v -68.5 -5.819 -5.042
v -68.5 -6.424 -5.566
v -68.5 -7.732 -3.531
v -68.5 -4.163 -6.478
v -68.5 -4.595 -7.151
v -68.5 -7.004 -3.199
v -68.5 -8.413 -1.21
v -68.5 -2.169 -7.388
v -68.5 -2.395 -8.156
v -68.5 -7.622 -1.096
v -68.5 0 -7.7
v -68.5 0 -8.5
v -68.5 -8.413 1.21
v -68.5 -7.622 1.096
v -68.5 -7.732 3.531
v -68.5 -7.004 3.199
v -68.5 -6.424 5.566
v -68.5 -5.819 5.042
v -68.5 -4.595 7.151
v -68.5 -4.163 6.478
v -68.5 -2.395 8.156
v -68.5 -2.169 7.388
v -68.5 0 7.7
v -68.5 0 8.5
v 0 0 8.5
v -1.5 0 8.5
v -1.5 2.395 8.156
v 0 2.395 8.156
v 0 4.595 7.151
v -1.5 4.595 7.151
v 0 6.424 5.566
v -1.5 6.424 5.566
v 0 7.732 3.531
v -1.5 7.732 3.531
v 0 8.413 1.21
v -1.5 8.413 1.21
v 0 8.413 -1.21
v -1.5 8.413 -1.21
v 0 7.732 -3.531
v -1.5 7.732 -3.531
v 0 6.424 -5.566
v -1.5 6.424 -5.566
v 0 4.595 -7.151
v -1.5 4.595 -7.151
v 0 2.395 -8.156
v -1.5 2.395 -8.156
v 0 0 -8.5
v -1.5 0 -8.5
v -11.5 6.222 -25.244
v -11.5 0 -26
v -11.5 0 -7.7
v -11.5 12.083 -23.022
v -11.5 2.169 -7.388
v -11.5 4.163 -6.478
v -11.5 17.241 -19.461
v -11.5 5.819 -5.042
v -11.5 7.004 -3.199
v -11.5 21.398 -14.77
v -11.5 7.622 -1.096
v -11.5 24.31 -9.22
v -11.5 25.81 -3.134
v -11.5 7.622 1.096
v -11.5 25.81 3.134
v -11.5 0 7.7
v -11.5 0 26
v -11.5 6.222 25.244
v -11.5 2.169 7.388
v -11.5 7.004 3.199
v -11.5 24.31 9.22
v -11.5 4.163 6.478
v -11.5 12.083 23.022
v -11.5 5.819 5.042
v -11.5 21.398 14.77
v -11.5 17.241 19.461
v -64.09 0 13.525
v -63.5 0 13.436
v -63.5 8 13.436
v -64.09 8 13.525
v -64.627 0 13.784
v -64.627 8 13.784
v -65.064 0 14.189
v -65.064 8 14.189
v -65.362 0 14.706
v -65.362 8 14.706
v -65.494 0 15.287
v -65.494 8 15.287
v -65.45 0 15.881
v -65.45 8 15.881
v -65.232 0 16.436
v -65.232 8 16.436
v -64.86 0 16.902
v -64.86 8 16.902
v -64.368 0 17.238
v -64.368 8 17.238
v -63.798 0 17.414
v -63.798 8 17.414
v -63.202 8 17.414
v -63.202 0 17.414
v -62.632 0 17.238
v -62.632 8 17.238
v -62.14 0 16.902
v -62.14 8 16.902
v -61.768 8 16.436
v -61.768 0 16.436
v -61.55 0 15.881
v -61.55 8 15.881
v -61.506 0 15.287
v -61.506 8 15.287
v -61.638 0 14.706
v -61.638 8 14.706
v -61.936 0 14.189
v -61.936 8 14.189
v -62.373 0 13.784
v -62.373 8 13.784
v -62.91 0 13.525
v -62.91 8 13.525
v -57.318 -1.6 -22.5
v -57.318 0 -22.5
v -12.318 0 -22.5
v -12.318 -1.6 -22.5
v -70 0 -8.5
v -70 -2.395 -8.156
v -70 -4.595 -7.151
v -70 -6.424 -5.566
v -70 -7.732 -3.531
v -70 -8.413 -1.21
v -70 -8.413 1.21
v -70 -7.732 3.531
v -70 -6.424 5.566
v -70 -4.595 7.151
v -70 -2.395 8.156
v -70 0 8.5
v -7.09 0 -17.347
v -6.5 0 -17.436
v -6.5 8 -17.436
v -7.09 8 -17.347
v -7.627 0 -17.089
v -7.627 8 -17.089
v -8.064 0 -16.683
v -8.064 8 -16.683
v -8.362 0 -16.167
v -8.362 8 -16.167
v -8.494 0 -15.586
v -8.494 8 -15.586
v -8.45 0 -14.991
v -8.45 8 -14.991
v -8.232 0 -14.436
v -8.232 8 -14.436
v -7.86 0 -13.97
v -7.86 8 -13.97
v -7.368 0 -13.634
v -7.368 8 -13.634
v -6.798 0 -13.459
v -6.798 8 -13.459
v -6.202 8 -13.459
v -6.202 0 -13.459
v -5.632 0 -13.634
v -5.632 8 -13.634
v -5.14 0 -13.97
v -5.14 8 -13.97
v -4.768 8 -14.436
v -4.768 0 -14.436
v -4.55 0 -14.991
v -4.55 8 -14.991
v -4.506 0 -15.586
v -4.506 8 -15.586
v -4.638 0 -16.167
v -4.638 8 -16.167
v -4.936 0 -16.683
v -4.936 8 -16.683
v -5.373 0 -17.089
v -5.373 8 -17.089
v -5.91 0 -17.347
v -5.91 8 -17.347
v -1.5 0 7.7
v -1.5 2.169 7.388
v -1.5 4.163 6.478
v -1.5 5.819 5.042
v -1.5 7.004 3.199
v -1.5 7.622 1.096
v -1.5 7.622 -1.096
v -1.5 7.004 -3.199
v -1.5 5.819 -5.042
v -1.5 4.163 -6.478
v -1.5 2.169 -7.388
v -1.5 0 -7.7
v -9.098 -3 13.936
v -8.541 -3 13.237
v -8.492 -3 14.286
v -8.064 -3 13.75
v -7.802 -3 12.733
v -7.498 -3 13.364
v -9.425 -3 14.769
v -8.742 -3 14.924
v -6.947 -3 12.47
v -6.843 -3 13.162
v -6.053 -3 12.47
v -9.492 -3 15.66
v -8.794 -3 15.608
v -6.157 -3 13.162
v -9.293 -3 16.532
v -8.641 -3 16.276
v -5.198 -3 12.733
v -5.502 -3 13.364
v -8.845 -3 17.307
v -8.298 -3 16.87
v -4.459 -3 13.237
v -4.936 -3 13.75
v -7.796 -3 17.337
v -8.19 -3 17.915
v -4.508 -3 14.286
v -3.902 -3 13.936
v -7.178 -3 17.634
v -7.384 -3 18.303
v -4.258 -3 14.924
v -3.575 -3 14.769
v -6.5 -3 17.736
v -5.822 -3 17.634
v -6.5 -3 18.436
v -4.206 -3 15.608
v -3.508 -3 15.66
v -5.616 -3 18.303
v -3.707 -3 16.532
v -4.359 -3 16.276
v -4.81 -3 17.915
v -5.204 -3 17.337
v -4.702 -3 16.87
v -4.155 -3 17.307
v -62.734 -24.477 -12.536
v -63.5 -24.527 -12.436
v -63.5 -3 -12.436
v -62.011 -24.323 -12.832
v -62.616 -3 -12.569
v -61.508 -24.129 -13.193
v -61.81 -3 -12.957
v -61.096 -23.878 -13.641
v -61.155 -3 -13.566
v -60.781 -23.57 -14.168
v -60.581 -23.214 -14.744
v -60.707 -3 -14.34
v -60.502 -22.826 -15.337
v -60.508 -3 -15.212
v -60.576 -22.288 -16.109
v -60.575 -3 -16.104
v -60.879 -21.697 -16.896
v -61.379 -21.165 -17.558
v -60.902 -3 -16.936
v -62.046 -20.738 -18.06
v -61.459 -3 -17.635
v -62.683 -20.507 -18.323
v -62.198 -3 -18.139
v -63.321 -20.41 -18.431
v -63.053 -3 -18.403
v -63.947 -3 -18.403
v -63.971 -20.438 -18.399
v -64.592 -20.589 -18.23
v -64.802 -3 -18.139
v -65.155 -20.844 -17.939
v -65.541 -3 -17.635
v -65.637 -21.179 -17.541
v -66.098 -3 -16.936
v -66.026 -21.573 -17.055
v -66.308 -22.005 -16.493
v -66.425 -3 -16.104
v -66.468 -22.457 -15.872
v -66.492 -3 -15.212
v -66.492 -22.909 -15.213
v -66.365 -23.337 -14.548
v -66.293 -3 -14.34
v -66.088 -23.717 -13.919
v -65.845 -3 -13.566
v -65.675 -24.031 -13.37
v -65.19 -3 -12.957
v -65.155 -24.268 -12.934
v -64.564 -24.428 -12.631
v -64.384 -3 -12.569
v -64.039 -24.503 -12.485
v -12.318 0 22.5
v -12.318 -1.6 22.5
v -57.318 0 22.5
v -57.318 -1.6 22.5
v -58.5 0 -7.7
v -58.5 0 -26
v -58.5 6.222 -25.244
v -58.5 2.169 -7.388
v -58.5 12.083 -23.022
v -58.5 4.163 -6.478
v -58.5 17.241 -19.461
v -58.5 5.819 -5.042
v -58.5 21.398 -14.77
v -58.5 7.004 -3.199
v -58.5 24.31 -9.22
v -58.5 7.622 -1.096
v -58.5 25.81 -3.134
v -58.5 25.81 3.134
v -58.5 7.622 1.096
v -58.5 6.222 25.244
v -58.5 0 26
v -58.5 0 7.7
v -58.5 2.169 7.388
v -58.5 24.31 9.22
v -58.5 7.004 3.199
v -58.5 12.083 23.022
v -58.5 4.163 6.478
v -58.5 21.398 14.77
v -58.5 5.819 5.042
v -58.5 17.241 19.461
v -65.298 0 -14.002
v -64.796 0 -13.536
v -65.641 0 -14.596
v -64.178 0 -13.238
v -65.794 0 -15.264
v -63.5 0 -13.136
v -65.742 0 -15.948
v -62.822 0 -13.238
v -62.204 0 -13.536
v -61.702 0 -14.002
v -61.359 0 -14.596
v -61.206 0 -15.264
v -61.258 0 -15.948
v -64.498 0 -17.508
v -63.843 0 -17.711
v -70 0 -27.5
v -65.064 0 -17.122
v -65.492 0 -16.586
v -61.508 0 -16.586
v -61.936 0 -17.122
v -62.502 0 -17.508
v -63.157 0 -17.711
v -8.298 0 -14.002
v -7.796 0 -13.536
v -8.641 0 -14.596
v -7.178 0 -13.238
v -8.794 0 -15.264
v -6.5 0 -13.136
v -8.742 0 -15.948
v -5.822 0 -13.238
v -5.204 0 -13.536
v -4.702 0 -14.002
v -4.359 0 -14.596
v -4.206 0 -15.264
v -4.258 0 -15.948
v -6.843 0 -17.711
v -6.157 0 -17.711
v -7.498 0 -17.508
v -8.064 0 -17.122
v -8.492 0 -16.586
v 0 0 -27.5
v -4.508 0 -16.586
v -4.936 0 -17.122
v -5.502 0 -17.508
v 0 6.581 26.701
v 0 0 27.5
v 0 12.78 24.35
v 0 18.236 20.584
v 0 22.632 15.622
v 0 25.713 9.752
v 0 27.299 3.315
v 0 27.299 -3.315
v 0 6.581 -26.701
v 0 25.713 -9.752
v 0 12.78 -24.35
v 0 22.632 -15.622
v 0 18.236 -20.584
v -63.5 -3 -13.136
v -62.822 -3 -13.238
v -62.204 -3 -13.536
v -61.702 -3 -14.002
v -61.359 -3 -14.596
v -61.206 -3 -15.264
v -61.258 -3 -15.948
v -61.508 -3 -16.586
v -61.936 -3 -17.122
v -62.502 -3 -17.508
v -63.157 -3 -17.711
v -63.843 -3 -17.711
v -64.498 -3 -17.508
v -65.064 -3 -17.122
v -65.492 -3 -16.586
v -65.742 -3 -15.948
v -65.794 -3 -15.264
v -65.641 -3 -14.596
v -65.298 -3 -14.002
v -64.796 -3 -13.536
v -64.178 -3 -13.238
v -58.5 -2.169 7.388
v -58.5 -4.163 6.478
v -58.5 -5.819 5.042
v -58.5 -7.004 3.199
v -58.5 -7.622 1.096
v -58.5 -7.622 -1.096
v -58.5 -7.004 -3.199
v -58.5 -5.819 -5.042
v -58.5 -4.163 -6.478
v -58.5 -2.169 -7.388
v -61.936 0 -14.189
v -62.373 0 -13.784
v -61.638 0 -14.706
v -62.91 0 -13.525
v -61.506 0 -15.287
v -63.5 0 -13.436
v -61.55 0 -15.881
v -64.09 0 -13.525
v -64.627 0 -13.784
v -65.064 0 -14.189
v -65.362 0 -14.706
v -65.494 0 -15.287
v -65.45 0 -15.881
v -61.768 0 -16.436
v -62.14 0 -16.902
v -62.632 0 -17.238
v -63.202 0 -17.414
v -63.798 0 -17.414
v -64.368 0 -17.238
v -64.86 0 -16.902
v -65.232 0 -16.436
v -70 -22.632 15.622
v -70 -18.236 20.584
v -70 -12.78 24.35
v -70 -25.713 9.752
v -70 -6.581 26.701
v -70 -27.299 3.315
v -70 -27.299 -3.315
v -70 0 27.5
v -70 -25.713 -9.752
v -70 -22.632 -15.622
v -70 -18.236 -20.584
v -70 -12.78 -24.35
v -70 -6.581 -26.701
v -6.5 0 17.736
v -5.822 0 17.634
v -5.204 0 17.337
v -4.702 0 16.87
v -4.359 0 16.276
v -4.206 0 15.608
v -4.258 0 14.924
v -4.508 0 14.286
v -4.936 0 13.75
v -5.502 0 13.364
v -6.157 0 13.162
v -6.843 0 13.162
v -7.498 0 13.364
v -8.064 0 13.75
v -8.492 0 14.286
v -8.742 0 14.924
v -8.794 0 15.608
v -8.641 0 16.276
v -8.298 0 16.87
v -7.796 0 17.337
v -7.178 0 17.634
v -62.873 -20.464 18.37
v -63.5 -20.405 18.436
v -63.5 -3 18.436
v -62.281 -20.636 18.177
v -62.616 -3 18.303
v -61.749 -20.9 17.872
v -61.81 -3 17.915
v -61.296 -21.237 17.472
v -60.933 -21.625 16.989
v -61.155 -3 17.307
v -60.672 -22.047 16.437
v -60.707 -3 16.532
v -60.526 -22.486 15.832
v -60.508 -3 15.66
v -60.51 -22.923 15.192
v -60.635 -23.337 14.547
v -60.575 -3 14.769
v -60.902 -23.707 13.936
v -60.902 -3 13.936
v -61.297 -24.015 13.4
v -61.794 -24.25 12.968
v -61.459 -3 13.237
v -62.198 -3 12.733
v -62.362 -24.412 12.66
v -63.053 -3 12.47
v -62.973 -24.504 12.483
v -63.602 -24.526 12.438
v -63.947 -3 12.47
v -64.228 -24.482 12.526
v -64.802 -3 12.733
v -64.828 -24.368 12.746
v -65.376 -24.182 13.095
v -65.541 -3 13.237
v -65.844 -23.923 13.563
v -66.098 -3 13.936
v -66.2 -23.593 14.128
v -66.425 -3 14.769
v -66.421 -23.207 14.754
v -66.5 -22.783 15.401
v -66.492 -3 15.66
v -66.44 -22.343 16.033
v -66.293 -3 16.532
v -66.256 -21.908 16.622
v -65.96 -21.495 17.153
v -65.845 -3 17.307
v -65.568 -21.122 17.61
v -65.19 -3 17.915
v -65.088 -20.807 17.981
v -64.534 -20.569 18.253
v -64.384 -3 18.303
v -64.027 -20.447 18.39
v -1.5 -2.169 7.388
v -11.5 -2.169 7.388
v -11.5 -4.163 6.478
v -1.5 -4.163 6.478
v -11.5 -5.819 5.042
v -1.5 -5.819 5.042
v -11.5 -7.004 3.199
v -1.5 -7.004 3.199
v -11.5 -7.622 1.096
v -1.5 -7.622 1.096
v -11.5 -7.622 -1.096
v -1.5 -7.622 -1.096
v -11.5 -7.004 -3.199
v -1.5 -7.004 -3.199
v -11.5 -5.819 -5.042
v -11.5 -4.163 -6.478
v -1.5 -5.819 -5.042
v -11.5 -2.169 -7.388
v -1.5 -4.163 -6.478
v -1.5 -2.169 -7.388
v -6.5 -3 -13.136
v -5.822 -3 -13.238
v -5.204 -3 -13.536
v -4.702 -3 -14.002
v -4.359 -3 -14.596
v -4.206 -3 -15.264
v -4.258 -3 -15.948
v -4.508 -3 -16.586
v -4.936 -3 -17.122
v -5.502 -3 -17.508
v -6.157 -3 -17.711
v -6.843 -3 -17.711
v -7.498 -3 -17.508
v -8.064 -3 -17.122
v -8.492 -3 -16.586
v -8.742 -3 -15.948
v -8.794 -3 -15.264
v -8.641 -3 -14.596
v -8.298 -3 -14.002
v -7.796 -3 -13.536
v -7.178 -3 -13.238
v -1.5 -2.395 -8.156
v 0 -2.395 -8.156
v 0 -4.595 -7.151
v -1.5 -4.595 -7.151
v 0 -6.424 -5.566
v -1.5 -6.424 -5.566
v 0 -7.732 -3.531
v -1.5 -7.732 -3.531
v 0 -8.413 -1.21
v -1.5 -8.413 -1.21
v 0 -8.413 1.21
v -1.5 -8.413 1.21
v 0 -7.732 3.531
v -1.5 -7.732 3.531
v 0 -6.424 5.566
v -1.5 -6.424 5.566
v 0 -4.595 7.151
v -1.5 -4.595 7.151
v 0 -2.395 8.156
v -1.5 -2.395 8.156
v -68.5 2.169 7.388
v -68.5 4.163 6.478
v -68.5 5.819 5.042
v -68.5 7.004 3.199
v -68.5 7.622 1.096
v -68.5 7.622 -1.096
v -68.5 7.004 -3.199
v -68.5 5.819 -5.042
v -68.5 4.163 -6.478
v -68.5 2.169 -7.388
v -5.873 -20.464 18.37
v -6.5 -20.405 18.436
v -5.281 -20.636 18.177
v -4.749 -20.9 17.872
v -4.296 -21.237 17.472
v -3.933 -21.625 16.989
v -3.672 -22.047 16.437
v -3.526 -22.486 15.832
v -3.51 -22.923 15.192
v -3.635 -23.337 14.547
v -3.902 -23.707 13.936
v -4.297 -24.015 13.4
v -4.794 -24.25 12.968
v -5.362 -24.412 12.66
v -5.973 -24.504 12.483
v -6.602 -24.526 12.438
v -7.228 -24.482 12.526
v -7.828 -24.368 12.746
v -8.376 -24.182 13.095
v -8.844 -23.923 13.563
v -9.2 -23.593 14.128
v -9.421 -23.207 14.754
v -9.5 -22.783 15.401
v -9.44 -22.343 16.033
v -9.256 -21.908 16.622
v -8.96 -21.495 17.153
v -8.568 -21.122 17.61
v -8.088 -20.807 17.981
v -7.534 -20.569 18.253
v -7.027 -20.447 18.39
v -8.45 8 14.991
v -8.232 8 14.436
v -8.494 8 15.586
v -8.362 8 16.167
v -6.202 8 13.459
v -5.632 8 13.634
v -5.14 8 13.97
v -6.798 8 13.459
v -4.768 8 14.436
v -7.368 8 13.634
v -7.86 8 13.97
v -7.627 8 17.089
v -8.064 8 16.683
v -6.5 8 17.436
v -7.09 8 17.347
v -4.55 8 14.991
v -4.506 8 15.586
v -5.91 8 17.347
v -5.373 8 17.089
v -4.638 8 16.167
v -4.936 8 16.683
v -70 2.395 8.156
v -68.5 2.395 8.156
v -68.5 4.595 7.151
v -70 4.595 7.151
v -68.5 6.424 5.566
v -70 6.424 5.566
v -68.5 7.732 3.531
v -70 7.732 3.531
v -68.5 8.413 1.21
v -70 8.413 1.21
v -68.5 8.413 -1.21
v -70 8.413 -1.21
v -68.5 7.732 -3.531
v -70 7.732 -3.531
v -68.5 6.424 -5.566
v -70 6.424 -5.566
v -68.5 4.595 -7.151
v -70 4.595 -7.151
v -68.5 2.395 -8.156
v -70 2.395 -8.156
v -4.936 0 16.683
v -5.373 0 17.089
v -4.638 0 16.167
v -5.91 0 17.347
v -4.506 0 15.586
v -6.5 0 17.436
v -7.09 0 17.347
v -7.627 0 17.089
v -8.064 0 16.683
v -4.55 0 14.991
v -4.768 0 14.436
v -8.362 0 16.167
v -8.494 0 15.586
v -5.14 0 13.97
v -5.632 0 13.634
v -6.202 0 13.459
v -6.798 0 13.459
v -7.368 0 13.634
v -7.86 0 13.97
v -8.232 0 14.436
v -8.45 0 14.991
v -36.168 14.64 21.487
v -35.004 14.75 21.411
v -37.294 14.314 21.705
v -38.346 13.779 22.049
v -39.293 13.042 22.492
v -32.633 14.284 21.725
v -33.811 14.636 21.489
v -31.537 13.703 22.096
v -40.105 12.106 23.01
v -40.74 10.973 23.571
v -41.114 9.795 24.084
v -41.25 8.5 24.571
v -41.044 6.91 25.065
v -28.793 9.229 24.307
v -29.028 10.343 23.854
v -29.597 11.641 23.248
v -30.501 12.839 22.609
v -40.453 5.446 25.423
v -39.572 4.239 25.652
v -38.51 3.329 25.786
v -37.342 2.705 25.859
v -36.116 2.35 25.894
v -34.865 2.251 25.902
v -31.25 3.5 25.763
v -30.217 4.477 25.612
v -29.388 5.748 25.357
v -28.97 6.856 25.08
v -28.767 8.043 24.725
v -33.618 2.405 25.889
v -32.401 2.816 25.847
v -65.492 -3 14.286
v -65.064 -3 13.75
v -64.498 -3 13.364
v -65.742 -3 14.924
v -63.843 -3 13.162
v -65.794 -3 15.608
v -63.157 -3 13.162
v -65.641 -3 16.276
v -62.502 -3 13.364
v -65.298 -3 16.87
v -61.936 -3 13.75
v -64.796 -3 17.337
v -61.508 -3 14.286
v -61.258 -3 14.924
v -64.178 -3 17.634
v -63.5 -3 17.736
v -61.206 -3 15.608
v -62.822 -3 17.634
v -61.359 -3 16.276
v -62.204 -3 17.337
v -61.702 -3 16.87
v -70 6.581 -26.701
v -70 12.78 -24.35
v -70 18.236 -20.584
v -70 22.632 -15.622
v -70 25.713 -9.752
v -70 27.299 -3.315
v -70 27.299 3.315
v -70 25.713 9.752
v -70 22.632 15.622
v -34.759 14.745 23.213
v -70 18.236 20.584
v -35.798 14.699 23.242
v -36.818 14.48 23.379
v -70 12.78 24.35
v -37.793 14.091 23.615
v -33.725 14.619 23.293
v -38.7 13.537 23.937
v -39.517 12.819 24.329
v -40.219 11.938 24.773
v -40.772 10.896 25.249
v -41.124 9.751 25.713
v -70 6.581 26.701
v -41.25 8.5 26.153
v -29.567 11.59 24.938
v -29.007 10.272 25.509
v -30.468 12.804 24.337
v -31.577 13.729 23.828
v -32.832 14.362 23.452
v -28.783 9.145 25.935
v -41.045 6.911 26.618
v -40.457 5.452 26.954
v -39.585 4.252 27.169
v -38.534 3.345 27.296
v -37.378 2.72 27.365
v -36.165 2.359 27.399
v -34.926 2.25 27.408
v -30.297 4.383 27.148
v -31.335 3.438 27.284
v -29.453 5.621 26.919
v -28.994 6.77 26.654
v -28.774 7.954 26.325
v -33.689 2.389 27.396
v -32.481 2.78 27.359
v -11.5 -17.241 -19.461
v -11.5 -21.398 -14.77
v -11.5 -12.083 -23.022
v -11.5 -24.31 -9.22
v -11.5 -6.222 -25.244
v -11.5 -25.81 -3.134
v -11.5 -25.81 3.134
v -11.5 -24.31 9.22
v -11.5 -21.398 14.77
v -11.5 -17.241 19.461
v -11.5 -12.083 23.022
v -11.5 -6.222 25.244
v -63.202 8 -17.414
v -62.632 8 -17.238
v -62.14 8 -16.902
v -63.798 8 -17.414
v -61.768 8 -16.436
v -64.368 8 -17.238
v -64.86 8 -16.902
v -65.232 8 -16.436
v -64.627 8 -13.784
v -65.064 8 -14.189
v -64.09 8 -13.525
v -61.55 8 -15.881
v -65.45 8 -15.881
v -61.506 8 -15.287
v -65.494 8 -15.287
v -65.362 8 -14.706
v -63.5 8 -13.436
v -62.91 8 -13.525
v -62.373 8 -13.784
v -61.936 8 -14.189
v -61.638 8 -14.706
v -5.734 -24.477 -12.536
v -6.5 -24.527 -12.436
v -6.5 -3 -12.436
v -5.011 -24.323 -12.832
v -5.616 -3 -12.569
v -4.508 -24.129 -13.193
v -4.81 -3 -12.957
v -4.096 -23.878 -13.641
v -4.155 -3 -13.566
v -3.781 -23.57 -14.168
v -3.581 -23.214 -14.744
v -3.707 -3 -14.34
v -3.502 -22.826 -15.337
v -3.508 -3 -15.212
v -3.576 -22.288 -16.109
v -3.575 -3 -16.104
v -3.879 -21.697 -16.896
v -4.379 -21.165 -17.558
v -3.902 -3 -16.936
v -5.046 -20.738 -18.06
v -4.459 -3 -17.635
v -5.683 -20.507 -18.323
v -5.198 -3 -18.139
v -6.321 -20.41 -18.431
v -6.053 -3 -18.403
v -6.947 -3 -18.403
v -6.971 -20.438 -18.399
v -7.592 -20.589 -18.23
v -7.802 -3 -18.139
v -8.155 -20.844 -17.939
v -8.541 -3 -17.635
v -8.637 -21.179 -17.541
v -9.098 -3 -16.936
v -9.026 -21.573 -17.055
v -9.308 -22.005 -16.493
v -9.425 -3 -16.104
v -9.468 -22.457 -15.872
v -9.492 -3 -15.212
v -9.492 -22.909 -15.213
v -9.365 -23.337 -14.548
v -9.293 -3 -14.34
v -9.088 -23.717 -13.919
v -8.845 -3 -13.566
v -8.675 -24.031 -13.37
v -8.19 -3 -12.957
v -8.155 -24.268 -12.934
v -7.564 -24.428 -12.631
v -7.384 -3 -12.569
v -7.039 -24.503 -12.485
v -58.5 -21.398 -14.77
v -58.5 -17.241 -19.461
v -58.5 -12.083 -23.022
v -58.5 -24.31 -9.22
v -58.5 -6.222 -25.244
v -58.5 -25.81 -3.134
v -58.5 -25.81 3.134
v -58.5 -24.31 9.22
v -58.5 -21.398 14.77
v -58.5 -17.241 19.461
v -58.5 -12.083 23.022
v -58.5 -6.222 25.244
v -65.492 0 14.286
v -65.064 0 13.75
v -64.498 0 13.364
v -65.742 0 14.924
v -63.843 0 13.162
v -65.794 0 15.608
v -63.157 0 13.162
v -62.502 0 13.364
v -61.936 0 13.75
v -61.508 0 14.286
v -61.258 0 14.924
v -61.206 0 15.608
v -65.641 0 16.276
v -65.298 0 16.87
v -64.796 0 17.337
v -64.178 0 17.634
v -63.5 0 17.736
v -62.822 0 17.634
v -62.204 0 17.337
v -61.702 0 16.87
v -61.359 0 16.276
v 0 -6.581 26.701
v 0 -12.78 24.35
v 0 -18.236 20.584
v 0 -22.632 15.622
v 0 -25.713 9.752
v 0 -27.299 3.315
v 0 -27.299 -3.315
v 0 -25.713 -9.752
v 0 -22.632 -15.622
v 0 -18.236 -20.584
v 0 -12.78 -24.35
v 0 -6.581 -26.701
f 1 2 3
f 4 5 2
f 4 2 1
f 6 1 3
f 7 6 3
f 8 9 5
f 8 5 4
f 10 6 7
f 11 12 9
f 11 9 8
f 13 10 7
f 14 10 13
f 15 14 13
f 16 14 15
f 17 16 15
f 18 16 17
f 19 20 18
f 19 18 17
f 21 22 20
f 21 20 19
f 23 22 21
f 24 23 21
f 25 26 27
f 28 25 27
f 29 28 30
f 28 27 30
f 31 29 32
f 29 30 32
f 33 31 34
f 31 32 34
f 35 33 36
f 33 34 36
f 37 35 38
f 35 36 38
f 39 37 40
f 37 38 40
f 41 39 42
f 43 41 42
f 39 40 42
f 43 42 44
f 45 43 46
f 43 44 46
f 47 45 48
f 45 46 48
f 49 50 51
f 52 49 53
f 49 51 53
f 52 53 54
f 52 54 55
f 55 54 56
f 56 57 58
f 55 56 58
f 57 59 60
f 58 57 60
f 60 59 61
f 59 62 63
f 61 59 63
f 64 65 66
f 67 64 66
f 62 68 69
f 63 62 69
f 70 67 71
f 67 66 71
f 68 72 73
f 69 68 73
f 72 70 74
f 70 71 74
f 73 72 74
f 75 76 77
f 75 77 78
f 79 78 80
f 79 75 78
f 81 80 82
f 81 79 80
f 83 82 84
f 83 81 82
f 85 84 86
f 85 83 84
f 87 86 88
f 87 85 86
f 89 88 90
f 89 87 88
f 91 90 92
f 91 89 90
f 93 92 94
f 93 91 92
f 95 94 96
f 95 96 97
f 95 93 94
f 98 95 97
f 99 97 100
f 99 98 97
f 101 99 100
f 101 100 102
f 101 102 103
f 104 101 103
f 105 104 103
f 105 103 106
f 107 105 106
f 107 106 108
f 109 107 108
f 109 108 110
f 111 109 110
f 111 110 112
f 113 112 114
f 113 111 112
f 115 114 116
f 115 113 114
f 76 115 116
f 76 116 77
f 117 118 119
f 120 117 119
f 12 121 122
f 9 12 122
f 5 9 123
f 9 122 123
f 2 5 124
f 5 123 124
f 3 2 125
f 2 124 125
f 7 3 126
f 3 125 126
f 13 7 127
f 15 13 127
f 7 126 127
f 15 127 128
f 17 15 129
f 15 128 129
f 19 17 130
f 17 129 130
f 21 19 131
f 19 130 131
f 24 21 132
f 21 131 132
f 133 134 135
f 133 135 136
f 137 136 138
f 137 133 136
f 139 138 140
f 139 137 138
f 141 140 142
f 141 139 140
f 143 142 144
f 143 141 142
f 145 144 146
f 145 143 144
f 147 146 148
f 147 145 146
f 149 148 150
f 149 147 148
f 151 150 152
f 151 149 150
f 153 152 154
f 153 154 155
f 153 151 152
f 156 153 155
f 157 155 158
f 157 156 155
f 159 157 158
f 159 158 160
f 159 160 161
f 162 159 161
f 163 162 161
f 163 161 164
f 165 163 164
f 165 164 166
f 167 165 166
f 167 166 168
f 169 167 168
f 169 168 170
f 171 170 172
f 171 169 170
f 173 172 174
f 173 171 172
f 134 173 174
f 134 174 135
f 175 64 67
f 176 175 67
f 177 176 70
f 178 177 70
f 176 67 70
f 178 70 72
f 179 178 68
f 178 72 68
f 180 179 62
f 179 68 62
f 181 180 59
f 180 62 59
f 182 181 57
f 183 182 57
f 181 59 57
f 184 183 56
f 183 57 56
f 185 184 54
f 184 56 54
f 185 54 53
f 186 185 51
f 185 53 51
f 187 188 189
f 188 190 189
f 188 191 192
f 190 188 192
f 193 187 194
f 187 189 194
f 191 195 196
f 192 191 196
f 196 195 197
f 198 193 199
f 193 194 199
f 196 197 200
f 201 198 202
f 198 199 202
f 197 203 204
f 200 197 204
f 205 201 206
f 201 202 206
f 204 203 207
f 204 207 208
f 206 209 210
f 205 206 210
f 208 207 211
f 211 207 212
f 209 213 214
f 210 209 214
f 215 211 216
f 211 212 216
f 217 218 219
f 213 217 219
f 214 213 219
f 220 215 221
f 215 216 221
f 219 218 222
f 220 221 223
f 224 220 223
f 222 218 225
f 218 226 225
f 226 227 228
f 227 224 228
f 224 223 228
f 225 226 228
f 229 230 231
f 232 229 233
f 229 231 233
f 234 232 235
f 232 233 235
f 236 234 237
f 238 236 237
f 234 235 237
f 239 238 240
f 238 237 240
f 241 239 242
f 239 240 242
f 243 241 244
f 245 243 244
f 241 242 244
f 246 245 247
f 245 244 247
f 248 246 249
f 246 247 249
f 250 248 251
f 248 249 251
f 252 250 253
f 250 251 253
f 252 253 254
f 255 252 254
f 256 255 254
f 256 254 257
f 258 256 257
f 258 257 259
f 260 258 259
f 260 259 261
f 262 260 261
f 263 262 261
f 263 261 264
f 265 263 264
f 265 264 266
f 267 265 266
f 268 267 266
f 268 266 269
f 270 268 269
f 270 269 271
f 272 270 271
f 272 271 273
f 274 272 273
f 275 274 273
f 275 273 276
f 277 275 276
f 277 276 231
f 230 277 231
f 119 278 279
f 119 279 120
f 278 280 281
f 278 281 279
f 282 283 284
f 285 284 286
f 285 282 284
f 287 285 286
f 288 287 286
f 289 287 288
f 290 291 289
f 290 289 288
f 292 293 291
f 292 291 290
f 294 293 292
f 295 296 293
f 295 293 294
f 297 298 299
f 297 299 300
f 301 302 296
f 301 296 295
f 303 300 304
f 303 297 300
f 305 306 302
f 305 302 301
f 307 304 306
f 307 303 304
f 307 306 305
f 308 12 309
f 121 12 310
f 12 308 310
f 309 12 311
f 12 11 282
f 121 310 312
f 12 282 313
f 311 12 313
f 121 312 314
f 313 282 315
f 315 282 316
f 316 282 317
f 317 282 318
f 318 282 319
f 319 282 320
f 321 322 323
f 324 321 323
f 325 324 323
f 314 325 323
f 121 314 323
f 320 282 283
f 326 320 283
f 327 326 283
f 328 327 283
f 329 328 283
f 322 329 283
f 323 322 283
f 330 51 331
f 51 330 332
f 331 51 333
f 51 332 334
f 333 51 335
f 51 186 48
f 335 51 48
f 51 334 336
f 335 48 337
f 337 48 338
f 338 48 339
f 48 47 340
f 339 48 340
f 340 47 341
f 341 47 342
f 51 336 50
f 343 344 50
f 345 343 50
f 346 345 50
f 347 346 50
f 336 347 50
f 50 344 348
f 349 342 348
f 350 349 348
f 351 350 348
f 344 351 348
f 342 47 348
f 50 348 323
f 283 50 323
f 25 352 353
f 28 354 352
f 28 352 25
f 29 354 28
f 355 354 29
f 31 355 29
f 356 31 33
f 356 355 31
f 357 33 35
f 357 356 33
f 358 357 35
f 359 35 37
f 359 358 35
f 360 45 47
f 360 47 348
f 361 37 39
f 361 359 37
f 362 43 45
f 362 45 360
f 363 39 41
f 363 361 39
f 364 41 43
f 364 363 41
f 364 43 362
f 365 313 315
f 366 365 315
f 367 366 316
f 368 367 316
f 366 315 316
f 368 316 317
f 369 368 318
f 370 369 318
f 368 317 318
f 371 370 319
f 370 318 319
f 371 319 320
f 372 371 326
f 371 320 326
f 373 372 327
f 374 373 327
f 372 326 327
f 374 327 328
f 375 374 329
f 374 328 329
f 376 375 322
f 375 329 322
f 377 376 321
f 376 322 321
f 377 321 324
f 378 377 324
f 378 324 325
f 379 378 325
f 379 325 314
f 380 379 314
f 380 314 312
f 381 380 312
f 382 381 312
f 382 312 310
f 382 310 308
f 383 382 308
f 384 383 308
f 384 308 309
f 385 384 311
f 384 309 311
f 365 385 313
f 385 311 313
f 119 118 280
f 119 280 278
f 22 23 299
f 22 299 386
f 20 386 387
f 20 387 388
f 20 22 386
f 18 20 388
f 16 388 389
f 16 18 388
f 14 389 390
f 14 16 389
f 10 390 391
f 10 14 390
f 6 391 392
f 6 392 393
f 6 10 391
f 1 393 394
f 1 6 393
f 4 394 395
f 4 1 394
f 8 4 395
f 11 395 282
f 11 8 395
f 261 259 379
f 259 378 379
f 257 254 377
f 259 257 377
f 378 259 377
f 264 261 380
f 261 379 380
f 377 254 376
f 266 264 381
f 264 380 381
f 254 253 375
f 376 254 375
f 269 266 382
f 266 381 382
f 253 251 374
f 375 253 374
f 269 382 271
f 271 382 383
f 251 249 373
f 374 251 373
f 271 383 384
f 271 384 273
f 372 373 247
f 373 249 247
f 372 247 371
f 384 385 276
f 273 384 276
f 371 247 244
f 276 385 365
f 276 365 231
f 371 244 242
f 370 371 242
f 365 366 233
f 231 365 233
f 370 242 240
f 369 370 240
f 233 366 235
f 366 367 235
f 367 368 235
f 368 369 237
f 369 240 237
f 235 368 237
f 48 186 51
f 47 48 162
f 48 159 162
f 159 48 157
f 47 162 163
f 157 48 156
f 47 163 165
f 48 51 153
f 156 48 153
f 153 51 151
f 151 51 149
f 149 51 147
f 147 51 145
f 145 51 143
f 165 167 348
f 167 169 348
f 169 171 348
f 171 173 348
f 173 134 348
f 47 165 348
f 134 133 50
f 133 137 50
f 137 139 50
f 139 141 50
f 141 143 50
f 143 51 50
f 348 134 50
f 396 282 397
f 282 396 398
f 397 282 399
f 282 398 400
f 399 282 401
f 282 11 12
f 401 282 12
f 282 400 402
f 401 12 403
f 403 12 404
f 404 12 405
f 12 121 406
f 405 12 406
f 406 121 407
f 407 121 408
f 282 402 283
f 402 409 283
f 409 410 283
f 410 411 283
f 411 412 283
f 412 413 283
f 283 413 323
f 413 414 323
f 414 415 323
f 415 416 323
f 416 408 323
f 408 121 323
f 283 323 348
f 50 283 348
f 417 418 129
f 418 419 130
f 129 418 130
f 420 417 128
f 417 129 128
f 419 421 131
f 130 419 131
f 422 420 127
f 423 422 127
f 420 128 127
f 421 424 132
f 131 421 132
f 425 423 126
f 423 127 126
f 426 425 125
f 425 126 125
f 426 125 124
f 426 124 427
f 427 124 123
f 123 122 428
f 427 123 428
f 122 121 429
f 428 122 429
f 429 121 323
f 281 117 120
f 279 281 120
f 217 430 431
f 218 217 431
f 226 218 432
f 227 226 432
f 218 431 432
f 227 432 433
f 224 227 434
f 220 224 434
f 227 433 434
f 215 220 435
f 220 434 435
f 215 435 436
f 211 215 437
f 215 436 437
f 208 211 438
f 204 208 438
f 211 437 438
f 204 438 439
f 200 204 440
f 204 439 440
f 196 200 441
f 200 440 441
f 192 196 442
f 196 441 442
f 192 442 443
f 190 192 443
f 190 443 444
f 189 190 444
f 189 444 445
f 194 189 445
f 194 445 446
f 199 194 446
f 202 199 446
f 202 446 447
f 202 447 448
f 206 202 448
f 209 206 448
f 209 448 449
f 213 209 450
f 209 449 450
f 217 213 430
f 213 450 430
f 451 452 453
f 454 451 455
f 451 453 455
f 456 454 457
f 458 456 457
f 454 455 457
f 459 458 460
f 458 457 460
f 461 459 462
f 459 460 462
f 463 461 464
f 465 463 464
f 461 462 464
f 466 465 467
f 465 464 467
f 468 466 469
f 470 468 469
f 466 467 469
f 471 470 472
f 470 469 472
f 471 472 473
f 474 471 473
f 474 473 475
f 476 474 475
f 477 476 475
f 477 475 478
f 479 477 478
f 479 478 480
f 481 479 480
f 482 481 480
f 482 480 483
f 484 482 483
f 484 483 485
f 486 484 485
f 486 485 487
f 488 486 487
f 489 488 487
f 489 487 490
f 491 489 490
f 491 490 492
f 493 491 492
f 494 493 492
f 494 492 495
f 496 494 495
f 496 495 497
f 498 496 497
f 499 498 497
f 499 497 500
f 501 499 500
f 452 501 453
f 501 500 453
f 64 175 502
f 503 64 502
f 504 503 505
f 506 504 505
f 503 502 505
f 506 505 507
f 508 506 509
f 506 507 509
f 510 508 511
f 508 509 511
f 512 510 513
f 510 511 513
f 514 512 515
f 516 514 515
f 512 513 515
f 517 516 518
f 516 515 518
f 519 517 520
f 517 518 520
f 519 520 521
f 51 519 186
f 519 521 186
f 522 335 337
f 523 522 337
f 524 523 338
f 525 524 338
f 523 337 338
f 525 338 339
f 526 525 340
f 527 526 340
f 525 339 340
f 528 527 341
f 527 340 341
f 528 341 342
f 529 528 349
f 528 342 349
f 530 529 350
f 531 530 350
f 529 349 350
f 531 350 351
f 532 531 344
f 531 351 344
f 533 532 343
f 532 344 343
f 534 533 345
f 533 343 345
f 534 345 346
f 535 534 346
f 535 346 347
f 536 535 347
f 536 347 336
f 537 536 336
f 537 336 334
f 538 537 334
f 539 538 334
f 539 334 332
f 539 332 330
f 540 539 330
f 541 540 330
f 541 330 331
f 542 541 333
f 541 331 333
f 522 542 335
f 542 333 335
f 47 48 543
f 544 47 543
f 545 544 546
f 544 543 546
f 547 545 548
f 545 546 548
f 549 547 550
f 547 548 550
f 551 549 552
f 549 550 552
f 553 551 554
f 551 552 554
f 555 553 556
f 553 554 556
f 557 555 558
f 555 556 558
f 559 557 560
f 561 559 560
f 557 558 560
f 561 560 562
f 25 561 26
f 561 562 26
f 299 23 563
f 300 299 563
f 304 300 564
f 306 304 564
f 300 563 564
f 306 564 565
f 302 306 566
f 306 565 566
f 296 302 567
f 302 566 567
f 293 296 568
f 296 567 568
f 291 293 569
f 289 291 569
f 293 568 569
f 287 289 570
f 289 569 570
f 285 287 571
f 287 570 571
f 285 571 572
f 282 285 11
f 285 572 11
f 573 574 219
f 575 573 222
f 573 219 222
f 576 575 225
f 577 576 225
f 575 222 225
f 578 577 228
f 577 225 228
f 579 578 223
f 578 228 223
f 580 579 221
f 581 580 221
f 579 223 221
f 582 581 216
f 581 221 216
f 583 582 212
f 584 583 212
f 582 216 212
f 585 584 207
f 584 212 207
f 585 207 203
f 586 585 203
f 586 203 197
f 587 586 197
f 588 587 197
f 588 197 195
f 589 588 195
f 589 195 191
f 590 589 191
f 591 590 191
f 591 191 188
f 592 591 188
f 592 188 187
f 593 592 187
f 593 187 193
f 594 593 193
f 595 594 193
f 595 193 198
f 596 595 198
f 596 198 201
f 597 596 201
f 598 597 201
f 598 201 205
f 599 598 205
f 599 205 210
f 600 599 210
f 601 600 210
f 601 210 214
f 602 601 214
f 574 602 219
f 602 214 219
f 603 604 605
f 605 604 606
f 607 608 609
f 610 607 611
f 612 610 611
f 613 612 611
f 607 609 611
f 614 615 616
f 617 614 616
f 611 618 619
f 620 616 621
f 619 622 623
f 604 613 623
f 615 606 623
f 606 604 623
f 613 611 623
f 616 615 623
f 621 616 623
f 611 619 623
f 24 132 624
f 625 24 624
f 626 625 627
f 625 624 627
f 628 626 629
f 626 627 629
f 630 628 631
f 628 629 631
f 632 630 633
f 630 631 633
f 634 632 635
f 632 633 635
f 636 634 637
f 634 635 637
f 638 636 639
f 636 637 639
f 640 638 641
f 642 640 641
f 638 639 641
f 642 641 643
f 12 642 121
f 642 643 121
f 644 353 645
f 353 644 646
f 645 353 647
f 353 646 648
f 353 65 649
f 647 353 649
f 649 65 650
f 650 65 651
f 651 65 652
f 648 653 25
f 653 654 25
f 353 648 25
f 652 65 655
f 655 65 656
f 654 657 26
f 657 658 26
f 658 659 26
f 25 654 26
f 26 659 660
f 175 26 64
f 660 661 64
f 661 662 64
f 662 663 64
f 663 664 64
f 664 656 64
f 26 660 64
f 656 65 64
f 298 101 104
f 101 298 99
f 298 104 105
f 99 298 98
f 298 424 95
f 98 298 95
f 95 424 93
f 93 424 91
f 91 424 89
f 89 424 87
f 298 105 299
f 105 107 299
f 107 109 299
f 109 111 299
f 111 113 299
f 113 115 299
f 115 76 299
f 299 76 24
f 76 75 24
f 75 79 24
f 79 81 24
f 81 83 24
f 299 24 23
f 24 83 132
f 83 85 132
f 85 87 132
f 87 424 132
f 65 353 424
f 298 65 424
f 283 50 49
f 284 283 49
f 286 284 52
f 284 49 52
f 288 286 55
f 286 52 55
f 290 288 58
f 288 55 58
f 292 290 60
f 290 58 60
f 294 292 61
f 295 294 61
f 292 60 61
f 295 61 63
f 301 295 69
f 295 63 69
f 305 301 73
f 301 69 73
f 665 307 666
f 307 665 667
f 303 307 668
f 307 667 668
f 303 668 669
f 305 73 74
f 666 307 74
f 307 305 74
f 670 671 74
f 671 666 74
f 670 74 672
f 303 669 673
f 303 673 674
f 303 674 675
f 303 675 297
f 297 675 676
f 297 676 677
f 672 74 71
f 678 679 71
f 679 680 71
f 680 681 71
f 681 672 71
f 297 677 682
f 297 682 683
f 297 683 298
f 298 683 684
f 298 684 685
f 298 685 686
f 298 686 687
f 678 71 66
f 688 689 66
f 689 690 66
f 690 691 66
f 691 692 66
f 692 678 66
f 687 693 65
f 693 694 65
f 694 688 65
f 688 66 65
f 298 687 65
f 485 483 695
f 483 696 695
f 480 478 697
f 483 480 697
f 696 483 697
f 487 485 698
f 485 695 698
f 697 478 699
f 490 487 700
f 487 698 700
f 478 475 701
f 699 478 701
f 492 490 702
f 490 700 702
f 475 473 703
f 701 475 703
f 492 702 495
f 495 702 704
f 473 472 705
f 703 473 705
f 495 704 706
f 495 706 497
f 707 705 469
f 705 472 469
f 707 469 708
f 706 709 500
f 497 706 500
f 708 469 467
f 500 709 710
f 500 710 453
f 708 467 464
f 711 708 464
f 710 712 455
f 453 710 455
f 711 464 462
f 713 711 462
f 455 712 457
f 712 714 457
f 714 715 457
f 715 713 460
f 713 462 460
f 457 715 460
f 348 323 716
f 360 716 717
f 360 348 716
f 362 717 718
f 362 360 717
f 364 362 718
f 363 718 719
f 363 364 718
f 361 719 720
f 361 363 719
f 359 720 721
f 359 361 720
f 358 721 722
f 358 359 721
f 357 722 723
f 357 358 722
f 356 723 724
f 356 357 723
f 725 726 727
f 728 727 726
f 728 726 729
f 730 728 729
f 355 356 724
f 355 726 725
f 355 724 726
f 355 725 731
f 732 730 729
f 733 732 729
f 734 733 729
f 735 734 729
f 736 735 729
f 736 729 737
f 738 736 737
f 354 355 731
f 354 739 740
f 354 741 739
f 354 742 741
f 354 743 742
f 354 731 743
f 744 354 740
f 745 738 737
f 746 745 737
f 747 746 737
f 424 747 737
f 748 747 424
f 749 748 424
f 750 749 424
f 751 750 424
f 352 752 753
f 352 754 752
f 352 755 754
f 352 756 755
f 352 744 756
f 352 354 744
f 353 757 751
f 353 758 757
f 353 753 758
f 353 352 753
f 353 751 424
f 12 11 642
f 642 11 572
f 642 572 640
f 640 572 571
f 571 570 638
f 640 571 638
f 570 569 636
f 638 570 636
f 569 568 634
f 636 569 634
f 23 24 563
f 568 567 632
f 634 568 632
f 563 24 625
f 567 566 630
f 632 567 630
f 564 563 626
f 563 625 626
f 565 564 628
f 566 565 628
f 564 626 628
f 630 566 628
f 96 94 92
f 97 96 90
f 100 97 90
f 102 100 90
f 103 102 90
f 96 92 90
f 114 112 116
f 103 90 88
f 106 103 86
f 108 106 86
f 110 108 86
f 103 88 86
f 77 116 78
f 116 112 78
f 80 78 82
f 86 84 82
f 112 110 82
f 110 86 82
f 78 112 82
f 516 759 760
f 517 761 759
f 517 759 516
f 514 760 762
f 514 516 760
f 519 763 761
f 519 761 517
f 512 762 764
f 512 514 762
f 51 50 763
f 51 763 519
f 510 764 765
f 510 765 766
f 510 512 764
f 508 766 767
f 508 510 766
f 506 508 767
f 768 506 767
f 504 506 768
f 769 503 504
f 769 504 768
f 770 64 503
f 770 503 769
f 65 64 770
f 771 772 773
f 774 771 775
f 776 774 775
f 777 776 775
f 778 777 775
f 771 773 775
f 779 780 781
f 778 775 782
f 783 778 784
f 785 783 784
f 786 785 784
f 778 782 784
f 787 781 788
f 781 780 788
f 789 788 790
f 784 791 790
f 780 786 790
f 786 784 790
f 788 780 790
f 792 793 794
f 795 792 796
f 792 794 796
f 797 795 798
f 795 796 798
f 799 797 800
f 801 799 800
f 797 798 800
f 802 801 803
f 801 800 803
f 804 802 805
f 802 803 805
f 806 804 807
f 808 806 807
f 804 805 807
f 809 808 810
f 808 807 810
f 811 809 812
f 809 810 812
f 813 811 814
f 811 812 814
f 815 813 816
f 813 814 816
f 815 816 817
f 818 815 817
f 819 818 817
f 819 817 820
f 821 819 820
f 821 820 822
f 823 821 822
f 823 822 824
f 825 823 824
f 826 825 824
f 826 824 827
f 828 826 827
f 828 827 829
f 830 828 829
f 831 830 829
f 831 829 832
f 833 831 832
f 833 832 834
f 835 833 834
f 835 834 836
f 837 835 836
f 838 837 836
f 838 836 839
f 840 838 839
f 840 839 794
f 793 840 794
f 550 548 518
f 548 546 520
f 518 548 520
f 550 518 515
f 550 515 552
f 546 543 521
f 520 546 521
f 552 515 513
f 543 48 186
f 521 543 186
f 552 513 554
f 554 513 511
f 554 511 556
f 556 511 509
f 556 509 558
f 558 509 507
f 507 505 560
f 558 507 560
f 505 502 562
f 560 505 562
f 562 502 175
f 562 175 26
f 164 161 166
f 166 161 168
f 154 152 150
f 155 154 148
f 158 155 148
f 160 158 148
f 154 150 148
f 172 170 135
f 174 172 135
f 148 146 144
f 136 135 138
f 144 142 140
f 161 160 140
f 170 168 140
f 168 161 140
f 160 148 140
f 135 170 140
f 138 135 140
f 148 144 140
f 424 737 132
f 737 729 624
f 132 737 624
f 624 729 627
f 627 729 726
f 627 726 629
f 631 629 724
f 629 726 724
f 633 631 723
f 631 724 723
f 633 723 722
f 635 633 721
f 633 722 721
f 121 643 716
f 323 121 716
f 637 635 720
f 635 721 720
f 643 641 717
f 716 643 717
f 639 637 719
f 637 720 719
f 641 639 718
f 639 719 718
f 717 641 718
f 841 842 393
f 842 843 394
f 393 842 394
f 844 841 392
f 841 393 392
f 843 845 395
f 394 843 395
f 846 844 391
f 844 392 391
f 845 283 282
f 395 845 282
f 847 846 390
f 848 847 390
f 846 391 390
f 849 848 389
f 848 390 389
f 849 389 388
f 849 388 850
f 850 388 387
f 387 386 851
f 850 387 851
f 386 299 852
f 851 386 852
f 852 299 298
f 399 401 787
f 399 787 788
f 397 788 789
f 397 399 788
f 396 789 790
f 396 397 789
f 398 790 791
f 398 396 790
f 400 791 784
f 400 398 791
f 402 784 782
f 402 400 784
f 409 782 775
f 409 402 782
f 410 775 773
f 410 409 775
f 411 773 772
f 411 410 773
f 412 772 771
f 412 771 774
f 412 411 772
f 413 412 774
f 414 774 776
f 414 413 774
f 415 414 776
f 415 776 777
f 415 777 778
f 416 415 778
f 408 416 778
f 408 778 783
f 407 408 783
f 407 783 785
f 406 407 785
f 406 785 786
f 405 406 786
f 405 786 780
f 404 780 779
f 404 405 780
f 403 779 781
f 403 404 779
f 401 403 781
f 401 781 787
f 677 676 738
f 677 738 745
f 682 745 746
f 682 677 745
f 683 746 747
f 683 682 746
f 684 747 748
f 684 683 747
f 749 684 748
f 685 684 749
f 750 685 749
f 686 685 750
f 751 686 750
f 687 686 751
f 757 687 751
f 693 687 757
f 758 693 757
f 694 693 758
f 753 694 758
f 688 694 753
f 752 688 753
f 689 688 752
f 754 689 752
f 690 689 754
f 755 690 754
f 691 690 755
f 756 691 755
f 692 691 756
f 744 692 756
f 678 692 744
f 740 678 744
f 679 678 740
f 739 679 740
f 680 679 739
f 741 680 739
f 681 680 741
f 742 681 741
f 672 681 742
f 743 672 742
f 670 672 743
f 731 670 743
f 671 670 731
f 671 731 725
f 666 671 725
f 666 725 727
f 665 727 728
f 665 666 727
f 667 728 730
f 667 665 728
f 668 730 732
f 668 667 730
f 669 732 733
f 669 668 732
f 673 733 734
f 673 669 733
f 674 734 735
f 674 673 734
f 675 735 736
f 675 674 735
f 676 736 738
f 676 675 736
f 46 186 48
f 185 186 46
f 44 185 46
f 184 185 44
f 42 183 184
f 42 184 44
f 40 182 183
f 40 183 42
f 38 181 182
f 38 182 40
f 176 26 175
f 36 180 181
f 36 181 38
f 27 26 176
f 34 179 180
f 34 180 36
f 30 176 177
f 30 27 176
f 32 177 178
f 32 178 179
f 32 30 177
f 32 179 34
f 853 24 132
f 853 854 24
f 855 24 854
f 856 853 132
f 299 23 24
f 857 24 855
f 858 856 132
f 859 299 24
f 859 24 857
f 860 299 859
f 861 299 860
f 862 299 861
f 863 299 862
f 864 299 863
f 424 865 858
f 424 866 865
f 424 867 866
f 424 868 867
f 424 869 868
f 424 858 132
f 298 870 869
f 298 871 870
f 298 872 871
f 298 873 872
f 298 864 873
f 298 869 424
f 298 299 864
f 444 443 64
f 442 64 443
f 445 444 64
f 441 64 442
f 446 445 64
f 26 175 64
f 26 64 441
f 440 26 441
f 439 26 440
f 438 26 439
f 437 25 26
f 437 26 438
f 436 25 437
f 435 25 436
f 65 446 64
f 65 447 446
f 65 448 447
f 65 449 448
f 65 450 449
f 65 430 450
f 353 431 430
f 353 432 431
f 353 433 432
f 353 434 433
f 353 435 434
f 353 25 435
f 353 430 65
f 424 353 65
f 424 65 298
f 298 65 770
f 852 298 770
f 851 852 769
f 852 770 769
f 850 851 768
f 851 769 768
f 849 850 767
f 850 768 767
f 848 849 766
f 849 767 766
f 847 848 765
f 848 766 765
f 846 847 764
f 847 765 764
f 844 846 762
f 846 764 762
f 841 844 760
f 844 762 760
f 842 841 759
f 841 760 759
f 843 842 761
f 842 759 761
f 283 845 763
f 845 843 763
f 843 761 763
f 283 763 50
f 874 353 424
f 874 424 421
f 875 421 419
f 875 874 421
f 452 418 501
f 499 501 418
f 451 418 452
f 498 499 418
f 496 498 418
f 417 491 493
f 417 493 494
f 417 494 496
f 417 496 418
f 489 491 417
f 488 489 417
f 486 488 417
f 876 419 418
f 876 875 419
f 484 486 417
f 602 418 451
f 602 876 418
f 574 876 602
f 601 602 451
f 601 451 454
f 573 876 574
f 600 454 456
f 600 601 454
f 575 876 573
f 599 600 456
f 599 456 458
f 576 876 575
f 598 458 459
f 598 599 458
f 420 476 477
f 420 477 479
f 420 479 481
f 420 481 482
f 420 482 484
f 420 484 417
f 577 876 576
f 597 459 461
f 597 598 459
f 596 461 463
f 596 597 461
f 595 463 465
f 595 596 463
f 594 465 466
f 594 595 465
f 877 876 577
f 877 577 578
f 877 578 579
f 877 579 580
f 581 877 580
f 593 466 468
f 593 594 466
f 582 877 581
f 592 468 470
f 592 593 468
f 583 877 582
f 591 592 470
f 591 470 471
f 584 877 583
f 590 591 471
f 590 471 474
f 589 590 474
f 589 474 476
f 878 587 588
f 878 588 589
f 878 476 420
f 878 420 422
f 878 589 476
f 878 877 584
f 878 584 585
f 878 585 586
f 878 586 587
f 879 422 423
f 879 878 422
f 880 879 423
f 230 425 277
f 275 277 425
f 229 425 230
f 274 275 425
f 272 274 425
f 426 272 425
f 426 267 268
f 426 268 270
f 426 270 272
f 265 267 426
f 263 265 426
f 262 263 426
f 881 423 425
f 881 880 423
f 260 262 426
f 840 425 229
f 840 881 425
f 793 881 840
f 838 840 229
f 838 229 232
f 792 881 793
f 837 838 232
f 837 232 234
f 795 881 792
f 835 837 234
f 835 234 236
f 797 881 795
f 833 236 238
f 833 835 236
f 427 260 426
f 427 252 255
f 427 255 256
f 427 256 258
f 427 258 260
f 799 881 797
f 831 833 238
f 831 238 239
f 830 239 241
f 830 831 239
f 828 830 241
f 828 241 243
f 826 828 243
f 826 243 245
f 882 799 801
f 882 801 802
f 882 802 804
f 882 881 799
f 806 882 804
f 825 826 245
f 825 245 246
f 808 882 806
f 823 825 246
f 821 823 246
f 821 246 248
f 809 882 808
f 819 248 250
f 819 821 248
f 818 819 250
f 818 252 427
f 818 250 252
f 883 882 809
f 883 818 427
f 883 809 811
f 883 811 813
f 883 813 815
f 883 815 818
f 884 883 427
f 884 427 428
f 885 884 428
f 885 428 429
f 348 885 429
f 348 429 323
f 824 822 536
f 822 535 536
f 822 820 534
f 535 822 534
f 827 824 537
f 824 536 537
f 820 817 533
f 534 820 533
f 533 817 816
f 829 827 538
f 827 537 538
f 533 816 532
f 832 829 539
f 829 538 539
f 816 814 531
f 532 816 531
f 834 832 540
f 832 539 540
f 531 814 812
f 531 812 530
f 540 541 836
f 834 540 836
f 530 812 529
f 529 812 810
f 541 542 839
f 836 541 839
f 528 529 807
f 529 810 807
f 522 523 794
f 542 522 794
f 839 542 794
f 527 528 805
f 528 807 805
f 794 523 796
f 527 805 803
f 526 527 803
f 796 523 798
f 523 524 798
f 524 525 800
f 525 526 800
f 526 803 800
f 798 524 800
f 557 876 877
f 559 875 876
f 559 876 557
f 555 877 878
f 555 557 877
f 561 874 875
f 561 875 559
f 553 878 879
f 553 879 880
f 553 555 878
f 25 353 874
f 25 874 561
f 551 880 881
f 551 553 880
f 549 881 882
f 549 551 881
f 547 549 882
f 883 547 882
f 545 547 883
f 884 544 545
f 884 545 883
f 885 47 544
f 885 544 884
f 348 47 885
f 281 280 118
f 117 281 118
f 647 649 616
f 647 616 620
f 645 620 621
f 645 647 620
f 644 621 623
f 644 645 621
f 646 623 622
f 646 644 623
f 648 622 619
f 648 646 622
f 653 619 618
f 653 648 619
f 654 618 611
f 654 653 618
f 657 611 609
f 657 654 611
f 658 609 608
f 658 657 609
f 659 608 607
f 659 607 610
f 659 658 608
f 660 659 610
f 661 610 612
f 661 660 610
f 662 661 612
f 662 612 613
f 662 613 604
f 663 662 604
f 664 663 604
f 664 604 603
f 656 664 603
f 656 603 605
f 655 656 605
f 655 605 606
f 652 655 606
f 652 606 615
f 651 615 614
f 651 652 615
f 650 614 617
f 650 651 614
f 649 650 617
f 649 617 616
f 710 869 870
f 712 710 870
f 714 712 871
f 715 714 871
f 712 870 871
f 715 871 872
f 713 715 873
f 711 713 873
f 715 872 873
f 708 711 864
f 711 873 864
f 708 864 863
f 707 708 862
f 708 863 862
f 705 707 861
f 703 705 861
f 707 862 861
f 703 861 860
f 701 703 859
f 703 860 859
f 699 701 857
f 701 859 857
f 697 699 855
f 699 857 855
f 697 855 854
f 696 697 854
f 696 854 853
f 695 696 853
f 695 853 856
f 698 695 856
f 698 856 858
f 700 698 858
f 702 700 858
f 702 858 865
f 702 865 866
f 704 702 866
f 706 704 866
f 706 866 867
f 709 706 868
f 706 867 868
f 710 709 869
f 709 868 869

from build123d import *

# Parameters (mm, degrees)
SKETCH1_R           = 27.5
BOSS_EXTRUDE1_DEPTH = 70
SHELL1_T            = -1.5
SHELL2_T            = -1.5
SKETCH2_R           = 8.5
CUT_EXTRUDE1_DEPTH  = 81.07808689
BOSS_EXTRUDE2_DEPTH = 10
SKETCH5_W           = 45
SKETCH5_H           = 45
BOSS_EXTRUDE3_DEPTH = 1.6
MIRROR6_START       = -68.5
MIRROR6_DEPTH       = 10
MIRROR6_START_2     = -11.5
MIRROR6_2_DEPTH     = 10
SKETCH6_R           = 2
CUT_EXTRUDE2_DEPTH  = 8
SKETCH7_R           = 3
CUT_EXTRUDE3_DEPTH  = 81.07808689
SKETCH8_R           = 3
SKETCH8_R_2         = 2.3
BOSS_EXTRUDE4_DEPTH = 3
SKETCH9_R           = 6.25
CUT_EXTRUDE4_DEPTH  = 81.078087046


with BuildPart() as part:
    # Sketch1 → Boss-Extrude1 (new body)
    with BuildSketch(Plane(origin=(0, 0, 0), x_dir=(0, 0, -1), z_dir=(1, 0, 0))):
        Circle(SKETCH1_R)
    extrude(amount=-BOSS_EXTRUDE1_DEPTH)


with BuildPart() as body_2:
    # Split1: the piece on the far side of the plane
    add(part.part)
    split(bisect_by=Plane.ZX, keep=Keep.BOTTOM)

    # Shell1
    shell1_openings = [body_2.faces().sort_by_distance(p)[0] for p in [
        (-35, 0, 0),
    ]]
    offset(amount=SHELL1_T, openings=shell1_openings)


with BuildPart() as part_1:
    add(part.part)

    # Split1
    split(bisect_by=Plane.ZX, keep=Keep.TOP)

    # Shell2
    shell2_openings = [part_1.faces().sort_by_distance(p)[0] for p in [
        (-35, 0, 0),
    ]]
    offset(amount=SHELL2_T, openings=shell2_openings)


with BuildPart() as cut_extrude1_tool:
    # Sketch2 → Cut-Extrude1 (new, through all)
    with BuildSketch(Plane.ZY.offset(70)):
        Circle(SKETCH2_R)
    extrude(amount=-CUT_EXTRUDE1_DEPTH)


with BuildPart() as part_2:
    add(part_1.part)

    # Cut-Extrude1: cut by cut_extrude1_tool
    add(cut_extrude1_tool.part, mode=Mode.SUBTRACT)

    # Mirror6: read off the stored shape, not the designer's step
    # Mirror6 outline → Mirror6 (add)
    with BuildSketch(Plane.YZ.offset(MIRROR6_START)):
        with BuildLine():
            Line((0, -7.7), (0, -26))
            ThreePointArc((0, -26), (26, 0), (0, 26))
            Line((0, 26), (0, 7.7))
            ThreePointArc((0, 7.7), (7.7, 0), (0, -7.7))
        make_face()
    extrude(amount=MIRROR6_DEPTH)

    # Mirror6 2 outline → Mirror6 2 (add)
    with BuildSketch(Plane.YZ.offset(MIRROR6_START_2)):
        with BuildLine():
            Line((0, -7.7), (0, -26))
            ThreePointArc((0, -26), (26, 0), (0, 26))
            Line((0, 26), (0, 7.7))
            ThreePointArc((0, 7.7), (7.7, 0), (0, -7.7))
        make_face()
    extrude(amount=MIRROR6_2_DEPTH)

    # Sketch6 → Cut-Extrude2 (cut)
    with BuildSketch(Plane(origin=(0, 0, 0), x_dir=(1, 0, 0), z_dir=(0, 1, 0))):
        with Locations(Location((-63.5, 15.436211609, 0), (0, 0, 270))):
            Circle(SKETCH6_R)
        with Locations(Location((-6.5, 15.436211609, 0), (0, 0, 90))):
            Circle(SKETCH6_R)
        with Locations(Location((-63.5, -15.436211609, 0), (0, 0, 90))):
            Circle(SKETCH6_R)
        with Locations(Location((-6.5, -15.436211609, 0), (0, 0, 270))):
            Circle(SKETCH6_R)
    extrude(amount=CUT_EXTRUDE2_DEPTH, mode=Mode.SUBTRACT)

    # Sketch9 → Cut-Extrude4 (cut, through all)
    with BuildSketch(Plane.XY):
        with Locations(Location((-35, 8.5, 0), (0, 0, 180))):
            Circle(SKETCH9_R)
    extrude(amount=CUT_EXTRUDE4_DEPTH, mode=Mode.SUBTRACT)


with BuildPart() as body_2_1:
    add(body_2.part)

    # Cut-Extrude1: cut by cut_extrude1_tool
    add(cut_extrude1_tool.part, mode=Mode.SUBTRACT)


with BuildPart() as body_3:
    # Sketch4 → Boss-Extrude2 (new body)
    with BuildSketch(Plane(origin=(-68.5, 0, 0), x_dir=(0, 0, -1), z_dir=(1, 0, 0))):
        with BuildLine():
            Line((-26, 0), (-7.7, 0))
            ThreePointArc((-7.7, 0), (0, -7.7), (7.7, 0))
            Line((7.7, 0), (26, 0))
            ThreePointArc((26, 0), (0, -26), (-26, 0))
        make_face()
    extrude(amount=BOSS_EXTRUDE2_DEPTH)


with BuildPart() as body_4:
    # Sketch5 → Boss-Extrude3 (new body)
    with BuildSketch(Plane(origin=(0, 0, 0), x_dir=(1, 0, 0), z_dir=(0, 1, 0))):
        with Locations((-34.817558458, 0)):
            Rectangle(SKETCH5_W, SKETCH5_H)
    extrude(amount=-BOSS_EXTRUDE3_DEPTH)


with BuildPart() as body_5:
    # Mirror4: mirrored copy
    add(body_3.part.mirror(Plane.ZY.offset(35)))


with BuildPart() as body_2_2:
    add(body_2_1.part)

    # Combine1: read off the stored shape, not the designer's step
    # Combine1: union body 3, body 5
    add(body_3.part)
    add(body_5.part)

    # Sketch7 → Cut-Extrude3 (cut, through all)
    with BuildSketch(Plane(origin=(0, 0, 0), x_dir=(1, 0, 0), z_dir=(0, 1, 0))):
        with Locations(Location((-63.5, 15.436211609, 0), (0, 0, 270))):
            Circle(SKETCH7_R)
        with Locations(Location((-6.5, 15.436211609, 0), (0, 0, 270))):
            Circle(SKETCH7_R)
        with Locations(Location((-6.5, -15.436211609, 0), (0, 0, 270))):
            Circle(SKETCH7_R)
        with Locations(Location((-63.5, -15.436211609, 0), (0, 0, 270))):
            Circle(SKETCH7_R)
    extrude(amount=-CUT_EXTRUDE3_DEPTH, mode=Mode.SUBTRACT)

    # Sketch8 → Boss-Extrude4 (add)
    # profile 1 of 4: a face of its own
    with BuildSketch(Plane(origin=(0, 0, 0), x_dir=(1, 0, 0), z_dir=(0, 1, 0))):
        with Locations(Location((-63.5, -15.436211609, 0), (0, 0, 270))):
            Circle(SKETCH8_R)
        with Locations(Location((-63.5, -15.436211609, 0), (0, 0, 270))):
            Circle(SKETCH8_R_2, mode=Mode.SUBTRACT)
    # profile 2 of 4: a face of its own
    with BuildSketch(Plane(origin=(0, 0, 0), x_dir=(1, 0, 0), z_dir=(0, 1, 0))):
        with Locations(Location((-6.5, -15.436211609, 0), (0, 0, 270))):
            Circle(SKETCH8_R)
        with Locations(Location((-6.5, -15.436211609, 0), (0, 0, 270))):
            Circle(SKETCH8_R_2, mode=Mode.SUBTRACT)
    # profile 3 of 4: a face of its own
    with BuildSketch(Plane(origin=(0, 0, 0), x_dir=(1, 0, 0), z_dir=(0, 1, 0))):
        with Locations(Location((-6.5, 15.436211609, 0), (0, 0, 270))):
            Circle(SKETCH8_R)
        with Locations(Location((-6.5, 15.436211609, 0), (0, 0, 270))):
            Circle(SKETCH8_R_2, mode=Mode.SUBTRACT)
    # profile 4 of 4: a face of its own
    with BuildSketch(Plane(origin=(0, 0, 0), x_dir=(1, 0, 0), z_dir=(0, 1, 0))):
        with Locations(Location((-63.5, 15.436211609, 0), (0, 0, 270))):
            Circle(SKETCH8_R)
        with Locations(Location((-63.5, 15.436211609, 0), (0, 0, 270))):
            Circle(SKETCH8_R_2, mode=Mode.SUBTRACT)
    extrude(amount=-BOSS_EXTRUDE4_DEPTH)


solid = Compound([part_2.part, body_4.part, body_2_2.part])
